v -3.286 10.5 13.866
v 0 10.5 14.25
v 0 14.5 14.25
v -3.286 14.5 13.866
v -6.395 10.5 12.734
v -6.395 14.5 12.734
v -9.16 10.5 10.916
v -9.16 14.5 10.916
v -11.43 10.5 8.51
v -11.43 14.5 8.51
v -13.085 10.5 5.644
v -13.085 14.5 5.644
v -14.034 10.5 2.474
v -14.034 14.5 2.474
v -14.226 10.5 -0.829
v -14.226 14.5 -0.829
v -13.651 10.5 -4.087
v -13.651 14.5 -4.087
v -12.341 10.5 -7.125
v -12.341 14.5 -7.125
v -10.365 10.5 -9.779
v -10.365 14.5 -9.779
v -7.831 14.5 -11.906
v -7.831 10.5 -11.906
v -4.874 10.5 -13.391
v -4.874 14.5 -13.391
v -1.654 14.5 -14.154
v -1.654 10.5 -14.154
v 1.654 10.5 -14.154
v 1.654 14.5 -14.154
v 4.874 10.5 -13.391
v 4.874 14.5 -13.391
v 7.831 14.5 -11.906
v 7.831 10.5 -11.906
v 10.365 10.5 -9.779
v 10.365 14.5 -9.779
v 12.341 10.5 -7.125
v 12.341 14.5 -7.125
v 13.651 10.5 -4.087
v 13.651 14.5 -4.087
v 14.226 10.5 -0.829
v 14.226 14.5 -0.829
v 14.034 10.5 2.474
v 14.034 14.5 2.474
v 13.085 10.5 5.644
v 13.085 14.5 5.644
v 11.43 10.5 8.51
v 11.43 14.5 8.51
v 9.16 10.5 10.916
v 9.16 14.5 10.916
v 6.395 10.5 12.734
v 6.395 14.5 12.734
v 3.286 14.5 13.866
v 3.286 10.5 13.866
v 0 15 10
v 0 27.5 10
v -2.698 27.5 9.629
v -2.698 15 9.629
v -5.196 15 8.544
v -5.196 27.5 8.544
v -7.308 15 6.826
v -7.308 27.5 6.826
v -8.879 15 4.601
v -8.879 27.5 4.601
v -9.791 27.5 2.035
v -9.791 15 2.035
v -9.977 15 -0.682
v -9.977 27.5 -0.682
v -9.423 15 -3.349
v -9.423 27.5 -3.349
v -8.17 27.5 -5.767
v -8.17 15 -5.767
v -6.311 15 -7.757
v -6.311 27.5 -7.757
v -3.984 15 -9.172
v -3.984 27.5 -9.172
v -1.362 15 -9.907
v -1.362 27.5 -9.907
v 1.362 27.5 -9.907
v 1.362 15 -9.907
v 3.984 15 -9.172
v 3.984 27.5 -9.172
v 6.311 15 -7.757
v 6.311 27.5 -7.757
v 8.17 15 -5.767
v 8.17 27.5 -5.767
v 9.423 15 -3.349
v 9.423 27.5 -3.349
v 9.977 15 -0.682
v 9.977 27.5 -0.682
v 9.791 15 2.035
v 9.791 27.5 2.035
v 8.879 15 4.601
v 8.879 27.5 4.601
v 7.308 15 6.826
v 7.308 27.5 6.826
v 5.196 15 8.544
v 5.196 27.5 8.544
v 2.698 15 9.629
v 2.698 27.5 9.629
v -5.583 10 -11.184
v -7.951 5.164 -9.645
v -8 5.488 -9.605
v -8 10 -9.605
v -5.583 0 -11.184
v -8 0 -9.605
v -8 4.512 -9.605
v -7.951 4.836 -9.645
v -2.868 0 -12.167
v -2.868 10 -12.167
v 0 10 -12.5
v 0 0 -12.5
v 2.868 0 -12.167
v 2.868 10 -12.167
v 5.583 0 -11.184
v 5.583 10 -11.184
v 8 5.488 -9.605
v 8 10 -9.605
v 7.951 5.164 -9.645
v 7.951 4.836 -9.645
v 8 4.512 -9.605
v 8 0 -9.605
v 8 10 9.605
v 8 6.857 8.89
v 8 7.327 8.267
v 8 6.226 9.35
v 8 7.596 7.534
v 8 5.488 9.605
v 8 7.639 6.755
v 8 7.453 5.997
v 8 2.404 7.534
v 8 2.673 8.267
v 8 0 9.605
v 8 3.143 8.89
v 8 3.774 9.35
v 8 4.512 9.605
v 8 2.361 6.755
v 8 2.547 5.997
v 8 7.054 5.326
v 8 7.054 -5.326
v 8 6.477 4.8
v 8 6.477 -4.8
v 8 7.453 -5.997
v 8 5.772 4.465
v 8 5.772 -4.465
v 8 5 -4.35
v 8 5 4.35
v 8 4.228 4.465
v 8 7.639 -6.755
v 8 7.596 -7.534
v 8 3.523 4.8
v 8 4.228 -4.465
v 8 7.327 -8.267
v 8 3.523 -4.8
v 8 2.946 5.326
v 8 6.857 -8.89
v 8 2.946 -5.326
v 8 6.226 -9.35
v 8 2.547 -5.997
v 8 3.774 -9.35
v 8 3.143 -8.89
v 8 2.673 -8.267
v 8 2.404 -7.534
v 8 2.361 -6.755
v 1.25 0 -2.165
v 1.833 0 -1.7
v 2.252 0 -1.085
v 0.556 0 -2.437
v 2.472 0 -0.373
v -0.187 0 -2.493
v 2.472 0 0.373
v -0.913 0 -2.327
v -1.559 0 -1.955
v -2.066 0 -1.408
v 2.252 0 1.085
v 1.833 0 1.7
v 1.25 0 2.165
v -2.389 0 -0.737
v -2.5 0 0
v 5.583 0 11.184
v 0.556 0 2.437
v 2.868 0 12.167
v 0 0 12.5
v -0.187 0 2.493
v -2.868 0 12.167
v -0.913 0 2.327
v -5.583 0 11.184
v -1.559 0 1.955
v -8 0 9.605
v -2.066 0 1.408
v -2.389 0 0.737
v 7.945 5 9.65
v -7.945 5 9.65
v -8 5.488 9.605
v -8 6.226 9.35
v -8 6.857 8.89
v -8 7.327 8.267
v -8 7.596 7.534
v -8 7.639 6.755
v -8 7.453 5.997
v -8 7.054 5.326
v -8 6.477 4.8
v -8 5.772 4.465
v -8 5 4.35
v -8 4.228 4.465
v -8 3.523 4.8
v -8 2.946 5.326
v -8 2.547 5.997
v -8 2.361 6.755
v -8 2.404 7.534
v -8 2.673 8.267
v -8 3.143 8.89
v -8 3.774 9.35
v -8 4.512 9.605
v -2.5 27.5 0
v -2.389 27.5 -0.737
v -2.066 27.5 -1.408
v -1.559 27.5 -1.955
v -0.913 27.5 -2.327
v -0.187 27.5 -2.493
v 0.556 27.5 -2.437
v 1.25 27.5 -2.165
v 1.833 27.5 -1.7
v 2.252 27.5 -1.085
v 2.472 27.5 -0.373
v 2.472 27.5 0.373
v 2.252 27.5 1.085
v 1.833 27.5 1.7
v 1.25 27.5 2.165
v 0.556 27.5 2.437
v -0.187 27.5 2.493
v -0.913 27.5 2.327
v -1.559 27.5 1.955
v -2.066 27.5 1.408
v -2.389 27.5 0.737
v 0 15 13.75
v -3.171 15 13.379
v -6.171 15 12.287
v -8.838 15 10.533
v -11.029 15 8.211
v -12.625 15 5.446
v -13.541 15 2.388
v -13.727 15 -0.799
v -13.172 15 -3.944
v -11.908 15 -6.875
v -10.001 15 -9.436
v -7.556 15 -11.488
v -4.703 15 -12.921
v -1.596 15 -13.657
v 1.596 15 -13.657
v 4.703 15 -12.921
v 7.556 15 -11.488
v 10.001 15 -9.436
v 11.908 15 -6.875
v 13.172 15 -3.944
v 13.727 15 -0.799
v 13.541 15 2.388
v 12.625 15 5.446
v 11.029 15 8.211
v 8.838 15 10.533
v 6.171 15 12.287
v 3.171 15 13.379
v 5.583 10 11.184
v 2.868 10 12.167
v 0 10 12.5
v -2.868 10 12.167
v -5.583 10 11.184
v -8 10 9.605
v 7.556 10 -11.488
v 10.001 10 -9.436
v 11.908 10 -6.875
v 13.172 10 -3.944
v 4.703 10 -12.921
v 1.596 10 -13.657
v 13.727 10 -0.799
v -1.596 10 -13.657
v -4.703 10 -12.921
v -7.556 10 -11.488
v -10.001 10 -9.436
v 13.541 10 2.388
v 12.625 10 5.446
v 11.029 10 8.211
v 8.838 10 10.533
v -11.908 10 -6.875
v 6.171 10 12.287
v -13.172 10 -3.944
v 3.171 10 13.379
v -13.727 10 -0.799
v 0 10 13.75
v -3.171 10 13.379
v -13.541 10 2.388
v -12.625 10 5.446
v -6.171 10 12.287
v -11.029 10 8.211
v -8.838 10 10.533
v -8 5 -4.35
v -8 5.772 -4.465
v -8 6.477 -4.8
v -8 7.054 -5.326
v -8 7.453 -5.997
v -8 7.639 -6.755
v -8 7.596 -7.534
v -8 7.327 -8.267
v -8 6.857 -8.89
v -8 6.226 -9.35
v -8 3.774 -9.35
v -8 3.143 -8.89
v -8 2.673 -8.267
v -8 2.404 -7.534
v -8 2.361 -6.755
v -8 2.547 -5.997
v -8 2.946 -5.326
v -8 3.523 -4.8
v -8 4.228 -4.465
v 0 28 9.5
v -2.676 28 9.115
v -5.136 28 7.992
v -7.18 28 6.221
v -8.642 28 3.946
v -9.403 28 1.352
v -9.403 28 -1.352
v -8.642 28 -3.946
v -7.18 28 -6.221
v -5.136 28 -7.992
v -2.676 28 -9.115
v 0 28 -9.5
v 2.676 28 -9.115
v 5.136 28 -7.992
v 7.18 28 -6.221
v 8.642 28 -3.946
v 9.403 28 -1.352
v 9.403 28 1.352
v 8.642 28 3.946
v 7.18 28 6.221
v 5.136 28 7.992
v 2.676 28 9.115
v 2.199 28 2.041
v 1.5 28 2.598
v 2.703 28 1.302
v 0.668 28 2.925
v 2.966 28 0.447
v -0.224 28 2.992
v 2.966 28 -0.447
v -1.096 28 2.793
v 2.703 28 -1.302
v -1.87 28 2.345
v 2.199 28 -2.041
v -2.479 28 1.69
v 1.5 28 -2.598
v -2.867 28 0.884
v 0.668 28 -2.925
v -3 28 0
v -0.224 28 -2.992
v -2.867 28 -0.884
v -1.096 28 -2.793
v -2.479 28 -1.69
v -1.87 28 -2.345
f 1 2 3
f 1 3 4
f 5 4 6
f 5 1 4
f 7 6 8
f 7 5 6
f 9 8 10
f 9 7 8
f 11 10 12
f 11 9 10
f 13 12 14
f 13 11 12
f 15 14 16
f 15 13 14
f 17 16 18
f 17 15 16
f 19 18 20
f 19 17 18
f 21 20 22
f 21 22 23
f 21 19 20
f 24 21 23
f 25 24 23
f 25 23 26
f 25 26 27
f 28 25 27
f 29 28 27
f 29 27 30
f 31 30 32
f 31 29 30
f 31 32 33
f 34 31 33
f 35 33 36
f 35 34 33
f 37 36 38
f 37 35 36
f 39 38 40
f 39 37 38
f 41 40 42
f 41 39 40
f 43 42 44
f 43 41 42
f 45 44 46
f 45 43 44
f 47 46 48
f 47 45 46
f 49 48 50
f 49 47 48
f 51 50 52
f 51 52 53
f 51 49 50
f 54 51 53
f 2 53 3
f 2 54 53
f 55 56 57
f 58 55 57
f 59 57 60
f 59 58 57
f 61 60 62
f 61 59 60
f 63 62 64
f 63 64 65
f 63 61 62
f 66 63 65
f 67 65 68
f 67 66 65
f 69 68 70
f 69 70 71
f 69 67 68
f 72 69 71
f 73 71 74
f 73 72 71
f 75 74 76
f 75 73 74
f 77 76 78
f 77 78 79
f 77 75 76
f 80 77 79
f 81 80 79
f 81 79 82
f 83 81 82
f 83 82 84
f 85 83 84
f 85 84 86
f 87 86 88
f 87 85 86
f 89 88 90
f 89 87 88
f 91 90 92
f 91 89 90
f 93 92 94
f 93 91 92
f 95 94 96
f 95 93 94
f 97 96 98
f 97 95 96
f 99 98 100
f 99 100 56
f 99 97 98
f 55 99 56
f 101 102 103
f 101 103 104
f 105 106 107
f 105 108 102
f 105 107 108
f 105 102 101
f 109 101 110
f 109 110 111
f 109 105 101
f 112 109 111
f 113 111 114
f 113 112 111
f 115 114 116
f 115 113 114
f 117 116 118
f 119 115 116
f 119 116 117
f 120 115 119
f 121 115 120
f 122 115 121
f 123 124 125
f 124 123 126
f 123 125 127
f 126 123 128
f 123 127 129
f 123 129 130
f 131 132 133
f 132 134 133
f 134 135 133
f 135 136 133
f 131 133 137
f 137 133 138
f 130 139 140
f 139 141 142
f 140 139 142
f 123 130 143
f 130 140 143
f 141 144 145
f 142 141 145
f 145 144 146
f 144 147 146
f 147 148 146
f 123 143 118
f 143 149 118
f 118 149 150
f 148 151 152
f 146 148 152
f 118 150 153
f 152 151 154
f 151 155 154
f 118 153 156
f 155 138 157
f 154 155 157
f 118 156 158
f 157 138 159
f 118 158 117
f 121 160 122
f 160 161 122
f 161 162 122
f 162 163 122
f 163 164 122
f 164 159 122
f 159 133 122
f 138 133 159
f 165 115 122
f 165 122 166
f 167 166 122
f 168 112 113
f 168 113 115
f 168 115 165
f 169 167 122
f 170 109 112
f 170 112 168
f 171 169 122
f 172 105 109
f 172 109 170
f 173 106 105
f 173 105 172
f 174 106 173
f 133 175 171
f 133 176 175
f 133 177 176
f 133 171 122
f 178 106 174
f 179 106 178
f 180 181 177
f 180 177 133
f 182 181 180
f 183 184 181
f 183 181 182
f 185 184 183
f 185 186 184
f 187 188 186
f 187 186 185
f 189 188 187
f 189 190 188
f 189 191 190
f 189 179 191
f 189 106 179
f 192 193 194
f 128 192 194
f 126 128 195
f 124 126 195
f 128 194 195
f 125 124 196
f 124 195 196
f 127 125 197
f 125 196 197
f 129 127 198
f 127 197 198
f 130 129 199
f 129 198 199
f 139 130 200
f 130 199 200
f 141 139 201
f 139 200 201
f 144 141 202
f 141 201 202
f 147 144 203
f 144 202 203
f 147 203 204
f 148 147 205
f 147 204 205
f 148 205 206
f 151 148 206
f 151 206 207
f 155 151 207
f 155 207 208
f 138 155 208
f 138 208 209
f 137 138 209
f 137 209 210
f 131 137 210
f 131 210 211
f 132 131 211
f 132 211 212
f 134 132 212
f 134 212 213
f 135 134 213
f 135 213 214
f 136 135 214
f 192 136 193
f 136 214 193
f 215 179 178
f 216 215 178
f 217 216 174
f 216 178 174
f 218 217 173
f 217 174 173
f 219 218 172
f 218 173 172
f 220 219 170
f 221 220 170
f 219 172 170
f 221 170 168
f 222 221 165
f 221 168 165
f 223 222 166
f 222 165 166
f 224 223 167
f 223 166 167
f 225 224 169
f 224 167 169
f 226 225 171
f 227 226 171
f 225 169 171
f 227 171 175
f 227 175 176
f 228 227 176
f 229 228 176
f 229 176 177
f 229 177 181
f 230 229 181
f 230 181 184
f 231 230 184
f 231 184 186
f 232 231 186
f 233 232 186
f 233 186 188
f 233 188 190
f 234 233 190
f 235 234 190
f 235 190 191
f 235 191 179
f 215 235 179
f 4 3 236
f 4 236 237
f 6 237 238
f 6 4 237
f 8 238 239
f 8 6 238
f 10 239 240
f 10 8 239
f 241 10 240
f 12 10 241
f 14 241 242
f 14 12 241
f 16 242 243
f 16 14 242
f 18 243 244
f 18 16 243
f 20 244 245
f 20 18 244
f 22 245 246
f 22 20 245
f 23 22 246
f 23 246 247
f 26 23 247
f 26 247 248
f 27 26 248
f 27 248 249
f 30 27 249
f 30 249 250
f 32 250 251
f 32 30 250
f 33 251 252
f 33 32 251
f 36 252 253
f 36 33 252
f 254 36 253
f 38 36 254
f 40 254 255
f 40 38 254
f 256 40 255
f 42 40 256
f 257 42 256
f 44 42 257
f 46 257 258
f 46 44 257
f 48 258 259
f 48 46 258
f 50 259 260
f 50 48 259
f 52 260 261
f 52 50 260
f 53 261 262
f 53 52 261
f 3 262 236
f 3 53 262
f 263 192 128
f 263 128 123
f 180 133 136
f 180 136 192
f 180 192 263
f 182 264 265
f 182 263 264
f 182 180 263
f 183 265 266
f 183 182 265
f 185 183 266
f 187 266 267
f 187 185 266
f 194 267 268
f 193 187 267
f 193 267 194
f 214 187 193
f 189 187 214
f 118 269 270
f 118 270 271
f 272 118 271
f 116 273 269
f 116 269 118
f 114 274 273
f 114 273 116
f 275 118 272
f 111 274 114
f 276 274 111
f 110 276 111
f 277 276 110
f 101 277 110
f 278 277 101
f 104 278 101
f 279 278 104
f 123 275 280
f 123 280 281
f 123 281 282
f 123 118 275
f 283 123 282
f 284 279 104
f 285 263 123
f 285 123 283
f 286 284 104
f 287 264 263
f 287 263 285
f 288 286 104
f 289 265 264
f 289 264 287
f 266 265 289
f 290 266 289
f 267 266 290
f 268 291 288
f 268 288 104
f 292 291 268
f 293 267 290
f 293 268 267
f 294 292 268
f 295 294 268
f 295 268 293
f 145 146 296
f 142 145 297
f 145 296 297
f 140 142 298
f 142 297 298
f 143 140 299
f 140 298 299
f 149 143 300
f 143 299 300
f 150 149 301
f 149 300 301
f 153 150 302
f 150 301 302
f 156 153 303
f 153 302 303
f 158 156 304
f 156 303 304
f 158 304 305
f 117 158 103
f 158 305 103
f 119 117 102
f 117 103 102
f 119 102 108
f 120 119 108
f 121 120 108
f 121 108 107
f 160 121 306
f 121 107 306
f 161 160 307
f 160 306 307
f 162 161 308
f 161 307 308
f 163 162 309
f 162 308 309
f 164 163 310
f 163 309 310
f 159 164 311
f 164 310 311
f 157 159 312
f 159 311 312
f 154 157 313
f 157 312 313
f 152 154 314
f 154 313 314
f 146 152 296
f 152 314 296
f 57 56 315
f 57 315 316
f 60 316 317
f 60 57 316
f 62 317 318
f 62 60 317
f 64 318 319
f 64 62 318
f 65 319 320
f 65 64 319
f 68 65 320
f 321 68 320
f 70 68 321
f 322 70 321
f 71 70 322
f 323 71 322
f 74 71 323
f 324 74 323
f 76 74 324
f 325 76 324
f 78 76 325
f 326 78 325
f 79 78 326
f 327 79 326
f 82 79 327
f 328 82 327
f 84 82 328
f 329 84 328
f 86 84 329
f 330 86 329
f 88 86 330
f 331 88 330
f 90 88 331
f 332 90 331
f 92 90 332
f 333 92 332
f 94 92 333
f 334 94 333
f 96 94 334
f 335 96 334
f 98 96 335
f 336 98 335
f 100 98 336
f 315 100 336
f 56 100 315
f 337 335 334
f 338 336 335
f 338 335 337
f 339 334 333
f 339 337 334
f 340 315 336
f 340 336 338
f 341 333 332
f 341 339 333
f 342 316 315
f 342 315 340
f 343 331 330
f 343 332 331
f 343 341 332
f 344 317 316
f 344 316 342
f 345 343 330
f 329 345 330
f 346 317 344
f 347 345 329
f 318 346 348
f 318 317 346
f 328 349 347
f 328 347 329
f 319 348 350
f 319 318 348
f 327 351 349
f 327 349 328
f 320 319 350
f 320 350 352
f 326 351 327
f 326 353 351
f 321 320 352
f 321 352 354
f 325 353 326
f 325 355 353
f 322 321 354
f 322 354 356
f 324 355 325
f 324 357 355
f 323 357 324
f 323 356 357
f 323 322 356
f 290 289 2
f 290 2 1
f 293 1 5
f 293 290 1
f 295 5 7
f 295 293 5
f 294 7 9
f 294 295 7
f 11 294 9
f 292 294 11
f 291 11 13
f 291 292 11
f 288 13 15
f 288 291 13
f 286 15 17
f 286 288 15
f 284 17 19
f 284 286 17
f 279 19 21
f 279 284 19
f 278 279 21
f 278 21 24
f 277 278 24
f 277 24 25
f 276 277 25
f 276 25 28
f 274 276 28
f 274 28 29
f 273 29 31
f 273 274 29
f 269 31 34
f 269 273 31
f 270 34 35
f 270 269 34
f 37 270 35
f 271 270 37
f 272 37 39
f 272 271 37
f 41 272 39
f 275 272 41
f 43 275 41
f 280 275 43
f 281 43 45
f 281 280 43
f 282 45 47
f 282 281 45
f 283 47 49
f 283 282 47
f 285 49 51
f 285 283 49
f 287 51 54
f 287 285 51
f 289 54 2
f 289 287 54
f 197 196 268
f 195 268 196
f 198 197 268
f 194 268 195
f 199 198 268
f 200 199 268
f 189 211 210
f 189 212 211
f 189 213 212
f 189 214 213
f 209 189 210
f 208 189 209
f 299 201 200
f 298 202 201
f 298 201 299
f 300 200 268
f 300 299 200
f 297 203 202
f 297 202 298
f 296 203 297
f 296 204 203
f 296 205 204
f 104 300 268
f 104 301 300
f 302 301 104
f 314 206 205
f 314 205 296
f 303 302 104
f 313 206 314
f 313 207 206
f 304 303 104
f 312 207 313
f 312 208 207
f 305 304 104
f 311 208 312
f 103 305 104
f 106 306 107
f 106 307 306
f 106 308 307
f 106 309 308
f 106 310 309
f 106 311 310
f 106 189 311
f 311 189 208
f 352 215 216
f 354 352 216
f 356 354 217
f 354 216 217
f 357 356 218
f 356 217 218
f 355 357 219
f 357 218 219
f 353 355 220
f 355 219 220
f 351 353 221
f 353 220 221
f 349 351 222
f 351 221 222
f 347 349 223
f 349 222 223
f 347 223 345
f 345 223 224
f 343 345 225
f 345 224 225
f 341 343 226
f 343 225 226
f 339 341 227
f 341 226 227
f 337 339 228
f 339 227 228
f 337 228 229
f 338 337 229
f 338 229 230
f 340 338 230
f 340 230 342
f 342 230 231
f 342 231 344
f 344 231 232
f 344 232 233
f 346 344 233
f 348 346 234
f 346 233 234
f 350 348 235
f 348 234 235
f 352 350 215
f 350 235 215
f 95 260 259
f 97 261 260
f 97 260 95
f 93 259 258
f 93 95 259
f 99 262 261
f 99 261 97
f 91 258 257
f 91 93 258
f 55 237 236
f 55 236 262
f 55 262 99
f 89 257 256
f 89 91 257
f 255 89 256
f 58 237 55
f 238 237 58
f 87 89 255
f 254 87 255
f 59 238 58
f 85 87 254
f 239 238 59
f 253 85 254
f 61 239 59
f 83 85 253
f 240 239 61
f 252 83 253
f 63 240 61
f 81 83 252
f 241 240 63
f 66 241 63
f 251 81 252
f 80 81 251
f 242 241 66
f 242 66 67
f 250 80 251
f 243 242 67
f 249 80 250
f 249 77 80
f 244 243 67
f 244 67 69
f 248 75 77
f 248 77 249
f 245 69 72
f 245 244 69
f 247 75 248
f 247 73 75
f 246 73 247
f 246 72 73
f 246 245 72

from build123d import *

# Parameters (mm, degrees)
WYTNIJ_WYCI_GNI_CIE1_DEPTH                        = 10
POG_BIENIE_WALCOWE_POD_M5_RUB_Z_BEM_W_D           = 5.3
POG_BIENIE_WALCOWE_POD_M5_RUB_Z_BEM_W_DEPTH       = 60
POG_BIENIE_WALCOWE_POD_M5_RUB_Z_BEM_W_CBORE_D     = 10
POG_BIENIE_WALCOWE_POD_M5_RUB_Z_BEM_W_CBORE_DEPTH = 5
POG_BIENIE_WALCOWE_POD_M5_RUB_Z_BEM_W_TIP         = 1.59228064
OTWORY_USTALAJ_CE_5_0MM1_D                        = 5
SFAZOWANIE1_SIZE                                  = 0.5


with BuildPart() as part:
    # Szkic1 → Obrót1 (revolve)
    with BuildSketch(Plane.XY, mode=Mode.PRIVATE) as obr_t1_sk:
        Polygon((0, 0), (0, 28), (10, 28), (10, 15), (14.25, 15), (14.25, 10), (12.5, 10), (12.5, 0), align=None)
    revolve(obr_t1_sk.sketch.rotate(Axis((0, 0, 0), (0, -1, 0)), 90), axis=Axis((0, 0, 0), (0, -1, 0)))

    # Szkic2 → Wytnij-wyciągnięcie1 (cut)
    with BuildSketch(Plane(origin=(0, 0, 0), x_dir=(-1, 0, 0), z_dir=(0, -1, 0))):
        with BuildLine():
            Line((-8, -9.604686356), (-8, 9.604686356))
            ThreePointArc((-8, 9.604686356), (-12.5, 0), (-8, -9.604686356))
        make_face()
        with BuildLine():
            Line((8, -9.604686356), (8, 9.604686356))
            ThreePointArc((8, 9.604686356), (12.5, 0), (8, -9.604686356))
        make_face()
    extrude(amount=-WYTNIJ_WYCI_GNI_CIE1_DEPTH, mode=Mode.SUBTRACT)

    # Pogłębienie walcowe pod M5 Śrubę z łbem walcowym z gniazdem
    with Locations(Plane(origin=(24.5, 33, -156.349537134), x_dir=(-2.1969032495960934e-12, 0, -1.0), z_dir=(1.0, 0, -2.1969032495960934e-12))):
        with Locations((-163.349537134, -28), (-149.349537134, -28)):
            CounterBoreHole(POG_BIENIE_WALCOWE_POD_M5_RUB_Z_BEM_W_D / 2, POG_BIENIE_WALCOWE_POD_M5_RUB_Z_BEM_W_CBORE_D / 2, POG_BIENIE_WALCOWE_POD_M5_RUB_Z_BEM_W_CBORE_DEPTH, depth=POG_BIENIE_WALCOWE_POD_M5_RUB_Z_BEM_W_DEPTH)
            with Locations((0, 0, -(POG_BIENIE_WALCOWE_POD_M5_RUB_Z_BEM_W_DEPTH + POG_BIENIE_WALCOWE_POD_M5_RUB_Z_BEM_W_TIP / 2))):  # 118° drill point
                Cone(0, POG_BIENIE_WALCOWE_POD_M5_RUB_Z_BEM_W_D / 2, POG_BIENIE_WALCOWE_POD_M5_RUB_Z_BEM_W_TIP, mode=Mode.SUBTRACT)

    # Otwory ustalające Ø5.0mm1 (through all)
    with Locations(Plane(origin=(0, 28, 0), x_dir=(1, 0, 0), z_dir=(0, 1, 0))):
        with Locations((0, 0)):
            Hole(OTWORY_USTALAJ_CE_5_0MM1_D / 2)

    # Sfazowanie1
    sfazowanie1_edges = [part.edges().sort_by_distance(p)[0] for p in [
        (2.5, 28, 0),
        (0, 10, -14.25),
        (0, 15, -14.25),
        (0, 28, -10),
    ]]
    chamfer(sfazowanie1_edges, length=SFAZOWANIE1_SIZE)


solid = part.part
